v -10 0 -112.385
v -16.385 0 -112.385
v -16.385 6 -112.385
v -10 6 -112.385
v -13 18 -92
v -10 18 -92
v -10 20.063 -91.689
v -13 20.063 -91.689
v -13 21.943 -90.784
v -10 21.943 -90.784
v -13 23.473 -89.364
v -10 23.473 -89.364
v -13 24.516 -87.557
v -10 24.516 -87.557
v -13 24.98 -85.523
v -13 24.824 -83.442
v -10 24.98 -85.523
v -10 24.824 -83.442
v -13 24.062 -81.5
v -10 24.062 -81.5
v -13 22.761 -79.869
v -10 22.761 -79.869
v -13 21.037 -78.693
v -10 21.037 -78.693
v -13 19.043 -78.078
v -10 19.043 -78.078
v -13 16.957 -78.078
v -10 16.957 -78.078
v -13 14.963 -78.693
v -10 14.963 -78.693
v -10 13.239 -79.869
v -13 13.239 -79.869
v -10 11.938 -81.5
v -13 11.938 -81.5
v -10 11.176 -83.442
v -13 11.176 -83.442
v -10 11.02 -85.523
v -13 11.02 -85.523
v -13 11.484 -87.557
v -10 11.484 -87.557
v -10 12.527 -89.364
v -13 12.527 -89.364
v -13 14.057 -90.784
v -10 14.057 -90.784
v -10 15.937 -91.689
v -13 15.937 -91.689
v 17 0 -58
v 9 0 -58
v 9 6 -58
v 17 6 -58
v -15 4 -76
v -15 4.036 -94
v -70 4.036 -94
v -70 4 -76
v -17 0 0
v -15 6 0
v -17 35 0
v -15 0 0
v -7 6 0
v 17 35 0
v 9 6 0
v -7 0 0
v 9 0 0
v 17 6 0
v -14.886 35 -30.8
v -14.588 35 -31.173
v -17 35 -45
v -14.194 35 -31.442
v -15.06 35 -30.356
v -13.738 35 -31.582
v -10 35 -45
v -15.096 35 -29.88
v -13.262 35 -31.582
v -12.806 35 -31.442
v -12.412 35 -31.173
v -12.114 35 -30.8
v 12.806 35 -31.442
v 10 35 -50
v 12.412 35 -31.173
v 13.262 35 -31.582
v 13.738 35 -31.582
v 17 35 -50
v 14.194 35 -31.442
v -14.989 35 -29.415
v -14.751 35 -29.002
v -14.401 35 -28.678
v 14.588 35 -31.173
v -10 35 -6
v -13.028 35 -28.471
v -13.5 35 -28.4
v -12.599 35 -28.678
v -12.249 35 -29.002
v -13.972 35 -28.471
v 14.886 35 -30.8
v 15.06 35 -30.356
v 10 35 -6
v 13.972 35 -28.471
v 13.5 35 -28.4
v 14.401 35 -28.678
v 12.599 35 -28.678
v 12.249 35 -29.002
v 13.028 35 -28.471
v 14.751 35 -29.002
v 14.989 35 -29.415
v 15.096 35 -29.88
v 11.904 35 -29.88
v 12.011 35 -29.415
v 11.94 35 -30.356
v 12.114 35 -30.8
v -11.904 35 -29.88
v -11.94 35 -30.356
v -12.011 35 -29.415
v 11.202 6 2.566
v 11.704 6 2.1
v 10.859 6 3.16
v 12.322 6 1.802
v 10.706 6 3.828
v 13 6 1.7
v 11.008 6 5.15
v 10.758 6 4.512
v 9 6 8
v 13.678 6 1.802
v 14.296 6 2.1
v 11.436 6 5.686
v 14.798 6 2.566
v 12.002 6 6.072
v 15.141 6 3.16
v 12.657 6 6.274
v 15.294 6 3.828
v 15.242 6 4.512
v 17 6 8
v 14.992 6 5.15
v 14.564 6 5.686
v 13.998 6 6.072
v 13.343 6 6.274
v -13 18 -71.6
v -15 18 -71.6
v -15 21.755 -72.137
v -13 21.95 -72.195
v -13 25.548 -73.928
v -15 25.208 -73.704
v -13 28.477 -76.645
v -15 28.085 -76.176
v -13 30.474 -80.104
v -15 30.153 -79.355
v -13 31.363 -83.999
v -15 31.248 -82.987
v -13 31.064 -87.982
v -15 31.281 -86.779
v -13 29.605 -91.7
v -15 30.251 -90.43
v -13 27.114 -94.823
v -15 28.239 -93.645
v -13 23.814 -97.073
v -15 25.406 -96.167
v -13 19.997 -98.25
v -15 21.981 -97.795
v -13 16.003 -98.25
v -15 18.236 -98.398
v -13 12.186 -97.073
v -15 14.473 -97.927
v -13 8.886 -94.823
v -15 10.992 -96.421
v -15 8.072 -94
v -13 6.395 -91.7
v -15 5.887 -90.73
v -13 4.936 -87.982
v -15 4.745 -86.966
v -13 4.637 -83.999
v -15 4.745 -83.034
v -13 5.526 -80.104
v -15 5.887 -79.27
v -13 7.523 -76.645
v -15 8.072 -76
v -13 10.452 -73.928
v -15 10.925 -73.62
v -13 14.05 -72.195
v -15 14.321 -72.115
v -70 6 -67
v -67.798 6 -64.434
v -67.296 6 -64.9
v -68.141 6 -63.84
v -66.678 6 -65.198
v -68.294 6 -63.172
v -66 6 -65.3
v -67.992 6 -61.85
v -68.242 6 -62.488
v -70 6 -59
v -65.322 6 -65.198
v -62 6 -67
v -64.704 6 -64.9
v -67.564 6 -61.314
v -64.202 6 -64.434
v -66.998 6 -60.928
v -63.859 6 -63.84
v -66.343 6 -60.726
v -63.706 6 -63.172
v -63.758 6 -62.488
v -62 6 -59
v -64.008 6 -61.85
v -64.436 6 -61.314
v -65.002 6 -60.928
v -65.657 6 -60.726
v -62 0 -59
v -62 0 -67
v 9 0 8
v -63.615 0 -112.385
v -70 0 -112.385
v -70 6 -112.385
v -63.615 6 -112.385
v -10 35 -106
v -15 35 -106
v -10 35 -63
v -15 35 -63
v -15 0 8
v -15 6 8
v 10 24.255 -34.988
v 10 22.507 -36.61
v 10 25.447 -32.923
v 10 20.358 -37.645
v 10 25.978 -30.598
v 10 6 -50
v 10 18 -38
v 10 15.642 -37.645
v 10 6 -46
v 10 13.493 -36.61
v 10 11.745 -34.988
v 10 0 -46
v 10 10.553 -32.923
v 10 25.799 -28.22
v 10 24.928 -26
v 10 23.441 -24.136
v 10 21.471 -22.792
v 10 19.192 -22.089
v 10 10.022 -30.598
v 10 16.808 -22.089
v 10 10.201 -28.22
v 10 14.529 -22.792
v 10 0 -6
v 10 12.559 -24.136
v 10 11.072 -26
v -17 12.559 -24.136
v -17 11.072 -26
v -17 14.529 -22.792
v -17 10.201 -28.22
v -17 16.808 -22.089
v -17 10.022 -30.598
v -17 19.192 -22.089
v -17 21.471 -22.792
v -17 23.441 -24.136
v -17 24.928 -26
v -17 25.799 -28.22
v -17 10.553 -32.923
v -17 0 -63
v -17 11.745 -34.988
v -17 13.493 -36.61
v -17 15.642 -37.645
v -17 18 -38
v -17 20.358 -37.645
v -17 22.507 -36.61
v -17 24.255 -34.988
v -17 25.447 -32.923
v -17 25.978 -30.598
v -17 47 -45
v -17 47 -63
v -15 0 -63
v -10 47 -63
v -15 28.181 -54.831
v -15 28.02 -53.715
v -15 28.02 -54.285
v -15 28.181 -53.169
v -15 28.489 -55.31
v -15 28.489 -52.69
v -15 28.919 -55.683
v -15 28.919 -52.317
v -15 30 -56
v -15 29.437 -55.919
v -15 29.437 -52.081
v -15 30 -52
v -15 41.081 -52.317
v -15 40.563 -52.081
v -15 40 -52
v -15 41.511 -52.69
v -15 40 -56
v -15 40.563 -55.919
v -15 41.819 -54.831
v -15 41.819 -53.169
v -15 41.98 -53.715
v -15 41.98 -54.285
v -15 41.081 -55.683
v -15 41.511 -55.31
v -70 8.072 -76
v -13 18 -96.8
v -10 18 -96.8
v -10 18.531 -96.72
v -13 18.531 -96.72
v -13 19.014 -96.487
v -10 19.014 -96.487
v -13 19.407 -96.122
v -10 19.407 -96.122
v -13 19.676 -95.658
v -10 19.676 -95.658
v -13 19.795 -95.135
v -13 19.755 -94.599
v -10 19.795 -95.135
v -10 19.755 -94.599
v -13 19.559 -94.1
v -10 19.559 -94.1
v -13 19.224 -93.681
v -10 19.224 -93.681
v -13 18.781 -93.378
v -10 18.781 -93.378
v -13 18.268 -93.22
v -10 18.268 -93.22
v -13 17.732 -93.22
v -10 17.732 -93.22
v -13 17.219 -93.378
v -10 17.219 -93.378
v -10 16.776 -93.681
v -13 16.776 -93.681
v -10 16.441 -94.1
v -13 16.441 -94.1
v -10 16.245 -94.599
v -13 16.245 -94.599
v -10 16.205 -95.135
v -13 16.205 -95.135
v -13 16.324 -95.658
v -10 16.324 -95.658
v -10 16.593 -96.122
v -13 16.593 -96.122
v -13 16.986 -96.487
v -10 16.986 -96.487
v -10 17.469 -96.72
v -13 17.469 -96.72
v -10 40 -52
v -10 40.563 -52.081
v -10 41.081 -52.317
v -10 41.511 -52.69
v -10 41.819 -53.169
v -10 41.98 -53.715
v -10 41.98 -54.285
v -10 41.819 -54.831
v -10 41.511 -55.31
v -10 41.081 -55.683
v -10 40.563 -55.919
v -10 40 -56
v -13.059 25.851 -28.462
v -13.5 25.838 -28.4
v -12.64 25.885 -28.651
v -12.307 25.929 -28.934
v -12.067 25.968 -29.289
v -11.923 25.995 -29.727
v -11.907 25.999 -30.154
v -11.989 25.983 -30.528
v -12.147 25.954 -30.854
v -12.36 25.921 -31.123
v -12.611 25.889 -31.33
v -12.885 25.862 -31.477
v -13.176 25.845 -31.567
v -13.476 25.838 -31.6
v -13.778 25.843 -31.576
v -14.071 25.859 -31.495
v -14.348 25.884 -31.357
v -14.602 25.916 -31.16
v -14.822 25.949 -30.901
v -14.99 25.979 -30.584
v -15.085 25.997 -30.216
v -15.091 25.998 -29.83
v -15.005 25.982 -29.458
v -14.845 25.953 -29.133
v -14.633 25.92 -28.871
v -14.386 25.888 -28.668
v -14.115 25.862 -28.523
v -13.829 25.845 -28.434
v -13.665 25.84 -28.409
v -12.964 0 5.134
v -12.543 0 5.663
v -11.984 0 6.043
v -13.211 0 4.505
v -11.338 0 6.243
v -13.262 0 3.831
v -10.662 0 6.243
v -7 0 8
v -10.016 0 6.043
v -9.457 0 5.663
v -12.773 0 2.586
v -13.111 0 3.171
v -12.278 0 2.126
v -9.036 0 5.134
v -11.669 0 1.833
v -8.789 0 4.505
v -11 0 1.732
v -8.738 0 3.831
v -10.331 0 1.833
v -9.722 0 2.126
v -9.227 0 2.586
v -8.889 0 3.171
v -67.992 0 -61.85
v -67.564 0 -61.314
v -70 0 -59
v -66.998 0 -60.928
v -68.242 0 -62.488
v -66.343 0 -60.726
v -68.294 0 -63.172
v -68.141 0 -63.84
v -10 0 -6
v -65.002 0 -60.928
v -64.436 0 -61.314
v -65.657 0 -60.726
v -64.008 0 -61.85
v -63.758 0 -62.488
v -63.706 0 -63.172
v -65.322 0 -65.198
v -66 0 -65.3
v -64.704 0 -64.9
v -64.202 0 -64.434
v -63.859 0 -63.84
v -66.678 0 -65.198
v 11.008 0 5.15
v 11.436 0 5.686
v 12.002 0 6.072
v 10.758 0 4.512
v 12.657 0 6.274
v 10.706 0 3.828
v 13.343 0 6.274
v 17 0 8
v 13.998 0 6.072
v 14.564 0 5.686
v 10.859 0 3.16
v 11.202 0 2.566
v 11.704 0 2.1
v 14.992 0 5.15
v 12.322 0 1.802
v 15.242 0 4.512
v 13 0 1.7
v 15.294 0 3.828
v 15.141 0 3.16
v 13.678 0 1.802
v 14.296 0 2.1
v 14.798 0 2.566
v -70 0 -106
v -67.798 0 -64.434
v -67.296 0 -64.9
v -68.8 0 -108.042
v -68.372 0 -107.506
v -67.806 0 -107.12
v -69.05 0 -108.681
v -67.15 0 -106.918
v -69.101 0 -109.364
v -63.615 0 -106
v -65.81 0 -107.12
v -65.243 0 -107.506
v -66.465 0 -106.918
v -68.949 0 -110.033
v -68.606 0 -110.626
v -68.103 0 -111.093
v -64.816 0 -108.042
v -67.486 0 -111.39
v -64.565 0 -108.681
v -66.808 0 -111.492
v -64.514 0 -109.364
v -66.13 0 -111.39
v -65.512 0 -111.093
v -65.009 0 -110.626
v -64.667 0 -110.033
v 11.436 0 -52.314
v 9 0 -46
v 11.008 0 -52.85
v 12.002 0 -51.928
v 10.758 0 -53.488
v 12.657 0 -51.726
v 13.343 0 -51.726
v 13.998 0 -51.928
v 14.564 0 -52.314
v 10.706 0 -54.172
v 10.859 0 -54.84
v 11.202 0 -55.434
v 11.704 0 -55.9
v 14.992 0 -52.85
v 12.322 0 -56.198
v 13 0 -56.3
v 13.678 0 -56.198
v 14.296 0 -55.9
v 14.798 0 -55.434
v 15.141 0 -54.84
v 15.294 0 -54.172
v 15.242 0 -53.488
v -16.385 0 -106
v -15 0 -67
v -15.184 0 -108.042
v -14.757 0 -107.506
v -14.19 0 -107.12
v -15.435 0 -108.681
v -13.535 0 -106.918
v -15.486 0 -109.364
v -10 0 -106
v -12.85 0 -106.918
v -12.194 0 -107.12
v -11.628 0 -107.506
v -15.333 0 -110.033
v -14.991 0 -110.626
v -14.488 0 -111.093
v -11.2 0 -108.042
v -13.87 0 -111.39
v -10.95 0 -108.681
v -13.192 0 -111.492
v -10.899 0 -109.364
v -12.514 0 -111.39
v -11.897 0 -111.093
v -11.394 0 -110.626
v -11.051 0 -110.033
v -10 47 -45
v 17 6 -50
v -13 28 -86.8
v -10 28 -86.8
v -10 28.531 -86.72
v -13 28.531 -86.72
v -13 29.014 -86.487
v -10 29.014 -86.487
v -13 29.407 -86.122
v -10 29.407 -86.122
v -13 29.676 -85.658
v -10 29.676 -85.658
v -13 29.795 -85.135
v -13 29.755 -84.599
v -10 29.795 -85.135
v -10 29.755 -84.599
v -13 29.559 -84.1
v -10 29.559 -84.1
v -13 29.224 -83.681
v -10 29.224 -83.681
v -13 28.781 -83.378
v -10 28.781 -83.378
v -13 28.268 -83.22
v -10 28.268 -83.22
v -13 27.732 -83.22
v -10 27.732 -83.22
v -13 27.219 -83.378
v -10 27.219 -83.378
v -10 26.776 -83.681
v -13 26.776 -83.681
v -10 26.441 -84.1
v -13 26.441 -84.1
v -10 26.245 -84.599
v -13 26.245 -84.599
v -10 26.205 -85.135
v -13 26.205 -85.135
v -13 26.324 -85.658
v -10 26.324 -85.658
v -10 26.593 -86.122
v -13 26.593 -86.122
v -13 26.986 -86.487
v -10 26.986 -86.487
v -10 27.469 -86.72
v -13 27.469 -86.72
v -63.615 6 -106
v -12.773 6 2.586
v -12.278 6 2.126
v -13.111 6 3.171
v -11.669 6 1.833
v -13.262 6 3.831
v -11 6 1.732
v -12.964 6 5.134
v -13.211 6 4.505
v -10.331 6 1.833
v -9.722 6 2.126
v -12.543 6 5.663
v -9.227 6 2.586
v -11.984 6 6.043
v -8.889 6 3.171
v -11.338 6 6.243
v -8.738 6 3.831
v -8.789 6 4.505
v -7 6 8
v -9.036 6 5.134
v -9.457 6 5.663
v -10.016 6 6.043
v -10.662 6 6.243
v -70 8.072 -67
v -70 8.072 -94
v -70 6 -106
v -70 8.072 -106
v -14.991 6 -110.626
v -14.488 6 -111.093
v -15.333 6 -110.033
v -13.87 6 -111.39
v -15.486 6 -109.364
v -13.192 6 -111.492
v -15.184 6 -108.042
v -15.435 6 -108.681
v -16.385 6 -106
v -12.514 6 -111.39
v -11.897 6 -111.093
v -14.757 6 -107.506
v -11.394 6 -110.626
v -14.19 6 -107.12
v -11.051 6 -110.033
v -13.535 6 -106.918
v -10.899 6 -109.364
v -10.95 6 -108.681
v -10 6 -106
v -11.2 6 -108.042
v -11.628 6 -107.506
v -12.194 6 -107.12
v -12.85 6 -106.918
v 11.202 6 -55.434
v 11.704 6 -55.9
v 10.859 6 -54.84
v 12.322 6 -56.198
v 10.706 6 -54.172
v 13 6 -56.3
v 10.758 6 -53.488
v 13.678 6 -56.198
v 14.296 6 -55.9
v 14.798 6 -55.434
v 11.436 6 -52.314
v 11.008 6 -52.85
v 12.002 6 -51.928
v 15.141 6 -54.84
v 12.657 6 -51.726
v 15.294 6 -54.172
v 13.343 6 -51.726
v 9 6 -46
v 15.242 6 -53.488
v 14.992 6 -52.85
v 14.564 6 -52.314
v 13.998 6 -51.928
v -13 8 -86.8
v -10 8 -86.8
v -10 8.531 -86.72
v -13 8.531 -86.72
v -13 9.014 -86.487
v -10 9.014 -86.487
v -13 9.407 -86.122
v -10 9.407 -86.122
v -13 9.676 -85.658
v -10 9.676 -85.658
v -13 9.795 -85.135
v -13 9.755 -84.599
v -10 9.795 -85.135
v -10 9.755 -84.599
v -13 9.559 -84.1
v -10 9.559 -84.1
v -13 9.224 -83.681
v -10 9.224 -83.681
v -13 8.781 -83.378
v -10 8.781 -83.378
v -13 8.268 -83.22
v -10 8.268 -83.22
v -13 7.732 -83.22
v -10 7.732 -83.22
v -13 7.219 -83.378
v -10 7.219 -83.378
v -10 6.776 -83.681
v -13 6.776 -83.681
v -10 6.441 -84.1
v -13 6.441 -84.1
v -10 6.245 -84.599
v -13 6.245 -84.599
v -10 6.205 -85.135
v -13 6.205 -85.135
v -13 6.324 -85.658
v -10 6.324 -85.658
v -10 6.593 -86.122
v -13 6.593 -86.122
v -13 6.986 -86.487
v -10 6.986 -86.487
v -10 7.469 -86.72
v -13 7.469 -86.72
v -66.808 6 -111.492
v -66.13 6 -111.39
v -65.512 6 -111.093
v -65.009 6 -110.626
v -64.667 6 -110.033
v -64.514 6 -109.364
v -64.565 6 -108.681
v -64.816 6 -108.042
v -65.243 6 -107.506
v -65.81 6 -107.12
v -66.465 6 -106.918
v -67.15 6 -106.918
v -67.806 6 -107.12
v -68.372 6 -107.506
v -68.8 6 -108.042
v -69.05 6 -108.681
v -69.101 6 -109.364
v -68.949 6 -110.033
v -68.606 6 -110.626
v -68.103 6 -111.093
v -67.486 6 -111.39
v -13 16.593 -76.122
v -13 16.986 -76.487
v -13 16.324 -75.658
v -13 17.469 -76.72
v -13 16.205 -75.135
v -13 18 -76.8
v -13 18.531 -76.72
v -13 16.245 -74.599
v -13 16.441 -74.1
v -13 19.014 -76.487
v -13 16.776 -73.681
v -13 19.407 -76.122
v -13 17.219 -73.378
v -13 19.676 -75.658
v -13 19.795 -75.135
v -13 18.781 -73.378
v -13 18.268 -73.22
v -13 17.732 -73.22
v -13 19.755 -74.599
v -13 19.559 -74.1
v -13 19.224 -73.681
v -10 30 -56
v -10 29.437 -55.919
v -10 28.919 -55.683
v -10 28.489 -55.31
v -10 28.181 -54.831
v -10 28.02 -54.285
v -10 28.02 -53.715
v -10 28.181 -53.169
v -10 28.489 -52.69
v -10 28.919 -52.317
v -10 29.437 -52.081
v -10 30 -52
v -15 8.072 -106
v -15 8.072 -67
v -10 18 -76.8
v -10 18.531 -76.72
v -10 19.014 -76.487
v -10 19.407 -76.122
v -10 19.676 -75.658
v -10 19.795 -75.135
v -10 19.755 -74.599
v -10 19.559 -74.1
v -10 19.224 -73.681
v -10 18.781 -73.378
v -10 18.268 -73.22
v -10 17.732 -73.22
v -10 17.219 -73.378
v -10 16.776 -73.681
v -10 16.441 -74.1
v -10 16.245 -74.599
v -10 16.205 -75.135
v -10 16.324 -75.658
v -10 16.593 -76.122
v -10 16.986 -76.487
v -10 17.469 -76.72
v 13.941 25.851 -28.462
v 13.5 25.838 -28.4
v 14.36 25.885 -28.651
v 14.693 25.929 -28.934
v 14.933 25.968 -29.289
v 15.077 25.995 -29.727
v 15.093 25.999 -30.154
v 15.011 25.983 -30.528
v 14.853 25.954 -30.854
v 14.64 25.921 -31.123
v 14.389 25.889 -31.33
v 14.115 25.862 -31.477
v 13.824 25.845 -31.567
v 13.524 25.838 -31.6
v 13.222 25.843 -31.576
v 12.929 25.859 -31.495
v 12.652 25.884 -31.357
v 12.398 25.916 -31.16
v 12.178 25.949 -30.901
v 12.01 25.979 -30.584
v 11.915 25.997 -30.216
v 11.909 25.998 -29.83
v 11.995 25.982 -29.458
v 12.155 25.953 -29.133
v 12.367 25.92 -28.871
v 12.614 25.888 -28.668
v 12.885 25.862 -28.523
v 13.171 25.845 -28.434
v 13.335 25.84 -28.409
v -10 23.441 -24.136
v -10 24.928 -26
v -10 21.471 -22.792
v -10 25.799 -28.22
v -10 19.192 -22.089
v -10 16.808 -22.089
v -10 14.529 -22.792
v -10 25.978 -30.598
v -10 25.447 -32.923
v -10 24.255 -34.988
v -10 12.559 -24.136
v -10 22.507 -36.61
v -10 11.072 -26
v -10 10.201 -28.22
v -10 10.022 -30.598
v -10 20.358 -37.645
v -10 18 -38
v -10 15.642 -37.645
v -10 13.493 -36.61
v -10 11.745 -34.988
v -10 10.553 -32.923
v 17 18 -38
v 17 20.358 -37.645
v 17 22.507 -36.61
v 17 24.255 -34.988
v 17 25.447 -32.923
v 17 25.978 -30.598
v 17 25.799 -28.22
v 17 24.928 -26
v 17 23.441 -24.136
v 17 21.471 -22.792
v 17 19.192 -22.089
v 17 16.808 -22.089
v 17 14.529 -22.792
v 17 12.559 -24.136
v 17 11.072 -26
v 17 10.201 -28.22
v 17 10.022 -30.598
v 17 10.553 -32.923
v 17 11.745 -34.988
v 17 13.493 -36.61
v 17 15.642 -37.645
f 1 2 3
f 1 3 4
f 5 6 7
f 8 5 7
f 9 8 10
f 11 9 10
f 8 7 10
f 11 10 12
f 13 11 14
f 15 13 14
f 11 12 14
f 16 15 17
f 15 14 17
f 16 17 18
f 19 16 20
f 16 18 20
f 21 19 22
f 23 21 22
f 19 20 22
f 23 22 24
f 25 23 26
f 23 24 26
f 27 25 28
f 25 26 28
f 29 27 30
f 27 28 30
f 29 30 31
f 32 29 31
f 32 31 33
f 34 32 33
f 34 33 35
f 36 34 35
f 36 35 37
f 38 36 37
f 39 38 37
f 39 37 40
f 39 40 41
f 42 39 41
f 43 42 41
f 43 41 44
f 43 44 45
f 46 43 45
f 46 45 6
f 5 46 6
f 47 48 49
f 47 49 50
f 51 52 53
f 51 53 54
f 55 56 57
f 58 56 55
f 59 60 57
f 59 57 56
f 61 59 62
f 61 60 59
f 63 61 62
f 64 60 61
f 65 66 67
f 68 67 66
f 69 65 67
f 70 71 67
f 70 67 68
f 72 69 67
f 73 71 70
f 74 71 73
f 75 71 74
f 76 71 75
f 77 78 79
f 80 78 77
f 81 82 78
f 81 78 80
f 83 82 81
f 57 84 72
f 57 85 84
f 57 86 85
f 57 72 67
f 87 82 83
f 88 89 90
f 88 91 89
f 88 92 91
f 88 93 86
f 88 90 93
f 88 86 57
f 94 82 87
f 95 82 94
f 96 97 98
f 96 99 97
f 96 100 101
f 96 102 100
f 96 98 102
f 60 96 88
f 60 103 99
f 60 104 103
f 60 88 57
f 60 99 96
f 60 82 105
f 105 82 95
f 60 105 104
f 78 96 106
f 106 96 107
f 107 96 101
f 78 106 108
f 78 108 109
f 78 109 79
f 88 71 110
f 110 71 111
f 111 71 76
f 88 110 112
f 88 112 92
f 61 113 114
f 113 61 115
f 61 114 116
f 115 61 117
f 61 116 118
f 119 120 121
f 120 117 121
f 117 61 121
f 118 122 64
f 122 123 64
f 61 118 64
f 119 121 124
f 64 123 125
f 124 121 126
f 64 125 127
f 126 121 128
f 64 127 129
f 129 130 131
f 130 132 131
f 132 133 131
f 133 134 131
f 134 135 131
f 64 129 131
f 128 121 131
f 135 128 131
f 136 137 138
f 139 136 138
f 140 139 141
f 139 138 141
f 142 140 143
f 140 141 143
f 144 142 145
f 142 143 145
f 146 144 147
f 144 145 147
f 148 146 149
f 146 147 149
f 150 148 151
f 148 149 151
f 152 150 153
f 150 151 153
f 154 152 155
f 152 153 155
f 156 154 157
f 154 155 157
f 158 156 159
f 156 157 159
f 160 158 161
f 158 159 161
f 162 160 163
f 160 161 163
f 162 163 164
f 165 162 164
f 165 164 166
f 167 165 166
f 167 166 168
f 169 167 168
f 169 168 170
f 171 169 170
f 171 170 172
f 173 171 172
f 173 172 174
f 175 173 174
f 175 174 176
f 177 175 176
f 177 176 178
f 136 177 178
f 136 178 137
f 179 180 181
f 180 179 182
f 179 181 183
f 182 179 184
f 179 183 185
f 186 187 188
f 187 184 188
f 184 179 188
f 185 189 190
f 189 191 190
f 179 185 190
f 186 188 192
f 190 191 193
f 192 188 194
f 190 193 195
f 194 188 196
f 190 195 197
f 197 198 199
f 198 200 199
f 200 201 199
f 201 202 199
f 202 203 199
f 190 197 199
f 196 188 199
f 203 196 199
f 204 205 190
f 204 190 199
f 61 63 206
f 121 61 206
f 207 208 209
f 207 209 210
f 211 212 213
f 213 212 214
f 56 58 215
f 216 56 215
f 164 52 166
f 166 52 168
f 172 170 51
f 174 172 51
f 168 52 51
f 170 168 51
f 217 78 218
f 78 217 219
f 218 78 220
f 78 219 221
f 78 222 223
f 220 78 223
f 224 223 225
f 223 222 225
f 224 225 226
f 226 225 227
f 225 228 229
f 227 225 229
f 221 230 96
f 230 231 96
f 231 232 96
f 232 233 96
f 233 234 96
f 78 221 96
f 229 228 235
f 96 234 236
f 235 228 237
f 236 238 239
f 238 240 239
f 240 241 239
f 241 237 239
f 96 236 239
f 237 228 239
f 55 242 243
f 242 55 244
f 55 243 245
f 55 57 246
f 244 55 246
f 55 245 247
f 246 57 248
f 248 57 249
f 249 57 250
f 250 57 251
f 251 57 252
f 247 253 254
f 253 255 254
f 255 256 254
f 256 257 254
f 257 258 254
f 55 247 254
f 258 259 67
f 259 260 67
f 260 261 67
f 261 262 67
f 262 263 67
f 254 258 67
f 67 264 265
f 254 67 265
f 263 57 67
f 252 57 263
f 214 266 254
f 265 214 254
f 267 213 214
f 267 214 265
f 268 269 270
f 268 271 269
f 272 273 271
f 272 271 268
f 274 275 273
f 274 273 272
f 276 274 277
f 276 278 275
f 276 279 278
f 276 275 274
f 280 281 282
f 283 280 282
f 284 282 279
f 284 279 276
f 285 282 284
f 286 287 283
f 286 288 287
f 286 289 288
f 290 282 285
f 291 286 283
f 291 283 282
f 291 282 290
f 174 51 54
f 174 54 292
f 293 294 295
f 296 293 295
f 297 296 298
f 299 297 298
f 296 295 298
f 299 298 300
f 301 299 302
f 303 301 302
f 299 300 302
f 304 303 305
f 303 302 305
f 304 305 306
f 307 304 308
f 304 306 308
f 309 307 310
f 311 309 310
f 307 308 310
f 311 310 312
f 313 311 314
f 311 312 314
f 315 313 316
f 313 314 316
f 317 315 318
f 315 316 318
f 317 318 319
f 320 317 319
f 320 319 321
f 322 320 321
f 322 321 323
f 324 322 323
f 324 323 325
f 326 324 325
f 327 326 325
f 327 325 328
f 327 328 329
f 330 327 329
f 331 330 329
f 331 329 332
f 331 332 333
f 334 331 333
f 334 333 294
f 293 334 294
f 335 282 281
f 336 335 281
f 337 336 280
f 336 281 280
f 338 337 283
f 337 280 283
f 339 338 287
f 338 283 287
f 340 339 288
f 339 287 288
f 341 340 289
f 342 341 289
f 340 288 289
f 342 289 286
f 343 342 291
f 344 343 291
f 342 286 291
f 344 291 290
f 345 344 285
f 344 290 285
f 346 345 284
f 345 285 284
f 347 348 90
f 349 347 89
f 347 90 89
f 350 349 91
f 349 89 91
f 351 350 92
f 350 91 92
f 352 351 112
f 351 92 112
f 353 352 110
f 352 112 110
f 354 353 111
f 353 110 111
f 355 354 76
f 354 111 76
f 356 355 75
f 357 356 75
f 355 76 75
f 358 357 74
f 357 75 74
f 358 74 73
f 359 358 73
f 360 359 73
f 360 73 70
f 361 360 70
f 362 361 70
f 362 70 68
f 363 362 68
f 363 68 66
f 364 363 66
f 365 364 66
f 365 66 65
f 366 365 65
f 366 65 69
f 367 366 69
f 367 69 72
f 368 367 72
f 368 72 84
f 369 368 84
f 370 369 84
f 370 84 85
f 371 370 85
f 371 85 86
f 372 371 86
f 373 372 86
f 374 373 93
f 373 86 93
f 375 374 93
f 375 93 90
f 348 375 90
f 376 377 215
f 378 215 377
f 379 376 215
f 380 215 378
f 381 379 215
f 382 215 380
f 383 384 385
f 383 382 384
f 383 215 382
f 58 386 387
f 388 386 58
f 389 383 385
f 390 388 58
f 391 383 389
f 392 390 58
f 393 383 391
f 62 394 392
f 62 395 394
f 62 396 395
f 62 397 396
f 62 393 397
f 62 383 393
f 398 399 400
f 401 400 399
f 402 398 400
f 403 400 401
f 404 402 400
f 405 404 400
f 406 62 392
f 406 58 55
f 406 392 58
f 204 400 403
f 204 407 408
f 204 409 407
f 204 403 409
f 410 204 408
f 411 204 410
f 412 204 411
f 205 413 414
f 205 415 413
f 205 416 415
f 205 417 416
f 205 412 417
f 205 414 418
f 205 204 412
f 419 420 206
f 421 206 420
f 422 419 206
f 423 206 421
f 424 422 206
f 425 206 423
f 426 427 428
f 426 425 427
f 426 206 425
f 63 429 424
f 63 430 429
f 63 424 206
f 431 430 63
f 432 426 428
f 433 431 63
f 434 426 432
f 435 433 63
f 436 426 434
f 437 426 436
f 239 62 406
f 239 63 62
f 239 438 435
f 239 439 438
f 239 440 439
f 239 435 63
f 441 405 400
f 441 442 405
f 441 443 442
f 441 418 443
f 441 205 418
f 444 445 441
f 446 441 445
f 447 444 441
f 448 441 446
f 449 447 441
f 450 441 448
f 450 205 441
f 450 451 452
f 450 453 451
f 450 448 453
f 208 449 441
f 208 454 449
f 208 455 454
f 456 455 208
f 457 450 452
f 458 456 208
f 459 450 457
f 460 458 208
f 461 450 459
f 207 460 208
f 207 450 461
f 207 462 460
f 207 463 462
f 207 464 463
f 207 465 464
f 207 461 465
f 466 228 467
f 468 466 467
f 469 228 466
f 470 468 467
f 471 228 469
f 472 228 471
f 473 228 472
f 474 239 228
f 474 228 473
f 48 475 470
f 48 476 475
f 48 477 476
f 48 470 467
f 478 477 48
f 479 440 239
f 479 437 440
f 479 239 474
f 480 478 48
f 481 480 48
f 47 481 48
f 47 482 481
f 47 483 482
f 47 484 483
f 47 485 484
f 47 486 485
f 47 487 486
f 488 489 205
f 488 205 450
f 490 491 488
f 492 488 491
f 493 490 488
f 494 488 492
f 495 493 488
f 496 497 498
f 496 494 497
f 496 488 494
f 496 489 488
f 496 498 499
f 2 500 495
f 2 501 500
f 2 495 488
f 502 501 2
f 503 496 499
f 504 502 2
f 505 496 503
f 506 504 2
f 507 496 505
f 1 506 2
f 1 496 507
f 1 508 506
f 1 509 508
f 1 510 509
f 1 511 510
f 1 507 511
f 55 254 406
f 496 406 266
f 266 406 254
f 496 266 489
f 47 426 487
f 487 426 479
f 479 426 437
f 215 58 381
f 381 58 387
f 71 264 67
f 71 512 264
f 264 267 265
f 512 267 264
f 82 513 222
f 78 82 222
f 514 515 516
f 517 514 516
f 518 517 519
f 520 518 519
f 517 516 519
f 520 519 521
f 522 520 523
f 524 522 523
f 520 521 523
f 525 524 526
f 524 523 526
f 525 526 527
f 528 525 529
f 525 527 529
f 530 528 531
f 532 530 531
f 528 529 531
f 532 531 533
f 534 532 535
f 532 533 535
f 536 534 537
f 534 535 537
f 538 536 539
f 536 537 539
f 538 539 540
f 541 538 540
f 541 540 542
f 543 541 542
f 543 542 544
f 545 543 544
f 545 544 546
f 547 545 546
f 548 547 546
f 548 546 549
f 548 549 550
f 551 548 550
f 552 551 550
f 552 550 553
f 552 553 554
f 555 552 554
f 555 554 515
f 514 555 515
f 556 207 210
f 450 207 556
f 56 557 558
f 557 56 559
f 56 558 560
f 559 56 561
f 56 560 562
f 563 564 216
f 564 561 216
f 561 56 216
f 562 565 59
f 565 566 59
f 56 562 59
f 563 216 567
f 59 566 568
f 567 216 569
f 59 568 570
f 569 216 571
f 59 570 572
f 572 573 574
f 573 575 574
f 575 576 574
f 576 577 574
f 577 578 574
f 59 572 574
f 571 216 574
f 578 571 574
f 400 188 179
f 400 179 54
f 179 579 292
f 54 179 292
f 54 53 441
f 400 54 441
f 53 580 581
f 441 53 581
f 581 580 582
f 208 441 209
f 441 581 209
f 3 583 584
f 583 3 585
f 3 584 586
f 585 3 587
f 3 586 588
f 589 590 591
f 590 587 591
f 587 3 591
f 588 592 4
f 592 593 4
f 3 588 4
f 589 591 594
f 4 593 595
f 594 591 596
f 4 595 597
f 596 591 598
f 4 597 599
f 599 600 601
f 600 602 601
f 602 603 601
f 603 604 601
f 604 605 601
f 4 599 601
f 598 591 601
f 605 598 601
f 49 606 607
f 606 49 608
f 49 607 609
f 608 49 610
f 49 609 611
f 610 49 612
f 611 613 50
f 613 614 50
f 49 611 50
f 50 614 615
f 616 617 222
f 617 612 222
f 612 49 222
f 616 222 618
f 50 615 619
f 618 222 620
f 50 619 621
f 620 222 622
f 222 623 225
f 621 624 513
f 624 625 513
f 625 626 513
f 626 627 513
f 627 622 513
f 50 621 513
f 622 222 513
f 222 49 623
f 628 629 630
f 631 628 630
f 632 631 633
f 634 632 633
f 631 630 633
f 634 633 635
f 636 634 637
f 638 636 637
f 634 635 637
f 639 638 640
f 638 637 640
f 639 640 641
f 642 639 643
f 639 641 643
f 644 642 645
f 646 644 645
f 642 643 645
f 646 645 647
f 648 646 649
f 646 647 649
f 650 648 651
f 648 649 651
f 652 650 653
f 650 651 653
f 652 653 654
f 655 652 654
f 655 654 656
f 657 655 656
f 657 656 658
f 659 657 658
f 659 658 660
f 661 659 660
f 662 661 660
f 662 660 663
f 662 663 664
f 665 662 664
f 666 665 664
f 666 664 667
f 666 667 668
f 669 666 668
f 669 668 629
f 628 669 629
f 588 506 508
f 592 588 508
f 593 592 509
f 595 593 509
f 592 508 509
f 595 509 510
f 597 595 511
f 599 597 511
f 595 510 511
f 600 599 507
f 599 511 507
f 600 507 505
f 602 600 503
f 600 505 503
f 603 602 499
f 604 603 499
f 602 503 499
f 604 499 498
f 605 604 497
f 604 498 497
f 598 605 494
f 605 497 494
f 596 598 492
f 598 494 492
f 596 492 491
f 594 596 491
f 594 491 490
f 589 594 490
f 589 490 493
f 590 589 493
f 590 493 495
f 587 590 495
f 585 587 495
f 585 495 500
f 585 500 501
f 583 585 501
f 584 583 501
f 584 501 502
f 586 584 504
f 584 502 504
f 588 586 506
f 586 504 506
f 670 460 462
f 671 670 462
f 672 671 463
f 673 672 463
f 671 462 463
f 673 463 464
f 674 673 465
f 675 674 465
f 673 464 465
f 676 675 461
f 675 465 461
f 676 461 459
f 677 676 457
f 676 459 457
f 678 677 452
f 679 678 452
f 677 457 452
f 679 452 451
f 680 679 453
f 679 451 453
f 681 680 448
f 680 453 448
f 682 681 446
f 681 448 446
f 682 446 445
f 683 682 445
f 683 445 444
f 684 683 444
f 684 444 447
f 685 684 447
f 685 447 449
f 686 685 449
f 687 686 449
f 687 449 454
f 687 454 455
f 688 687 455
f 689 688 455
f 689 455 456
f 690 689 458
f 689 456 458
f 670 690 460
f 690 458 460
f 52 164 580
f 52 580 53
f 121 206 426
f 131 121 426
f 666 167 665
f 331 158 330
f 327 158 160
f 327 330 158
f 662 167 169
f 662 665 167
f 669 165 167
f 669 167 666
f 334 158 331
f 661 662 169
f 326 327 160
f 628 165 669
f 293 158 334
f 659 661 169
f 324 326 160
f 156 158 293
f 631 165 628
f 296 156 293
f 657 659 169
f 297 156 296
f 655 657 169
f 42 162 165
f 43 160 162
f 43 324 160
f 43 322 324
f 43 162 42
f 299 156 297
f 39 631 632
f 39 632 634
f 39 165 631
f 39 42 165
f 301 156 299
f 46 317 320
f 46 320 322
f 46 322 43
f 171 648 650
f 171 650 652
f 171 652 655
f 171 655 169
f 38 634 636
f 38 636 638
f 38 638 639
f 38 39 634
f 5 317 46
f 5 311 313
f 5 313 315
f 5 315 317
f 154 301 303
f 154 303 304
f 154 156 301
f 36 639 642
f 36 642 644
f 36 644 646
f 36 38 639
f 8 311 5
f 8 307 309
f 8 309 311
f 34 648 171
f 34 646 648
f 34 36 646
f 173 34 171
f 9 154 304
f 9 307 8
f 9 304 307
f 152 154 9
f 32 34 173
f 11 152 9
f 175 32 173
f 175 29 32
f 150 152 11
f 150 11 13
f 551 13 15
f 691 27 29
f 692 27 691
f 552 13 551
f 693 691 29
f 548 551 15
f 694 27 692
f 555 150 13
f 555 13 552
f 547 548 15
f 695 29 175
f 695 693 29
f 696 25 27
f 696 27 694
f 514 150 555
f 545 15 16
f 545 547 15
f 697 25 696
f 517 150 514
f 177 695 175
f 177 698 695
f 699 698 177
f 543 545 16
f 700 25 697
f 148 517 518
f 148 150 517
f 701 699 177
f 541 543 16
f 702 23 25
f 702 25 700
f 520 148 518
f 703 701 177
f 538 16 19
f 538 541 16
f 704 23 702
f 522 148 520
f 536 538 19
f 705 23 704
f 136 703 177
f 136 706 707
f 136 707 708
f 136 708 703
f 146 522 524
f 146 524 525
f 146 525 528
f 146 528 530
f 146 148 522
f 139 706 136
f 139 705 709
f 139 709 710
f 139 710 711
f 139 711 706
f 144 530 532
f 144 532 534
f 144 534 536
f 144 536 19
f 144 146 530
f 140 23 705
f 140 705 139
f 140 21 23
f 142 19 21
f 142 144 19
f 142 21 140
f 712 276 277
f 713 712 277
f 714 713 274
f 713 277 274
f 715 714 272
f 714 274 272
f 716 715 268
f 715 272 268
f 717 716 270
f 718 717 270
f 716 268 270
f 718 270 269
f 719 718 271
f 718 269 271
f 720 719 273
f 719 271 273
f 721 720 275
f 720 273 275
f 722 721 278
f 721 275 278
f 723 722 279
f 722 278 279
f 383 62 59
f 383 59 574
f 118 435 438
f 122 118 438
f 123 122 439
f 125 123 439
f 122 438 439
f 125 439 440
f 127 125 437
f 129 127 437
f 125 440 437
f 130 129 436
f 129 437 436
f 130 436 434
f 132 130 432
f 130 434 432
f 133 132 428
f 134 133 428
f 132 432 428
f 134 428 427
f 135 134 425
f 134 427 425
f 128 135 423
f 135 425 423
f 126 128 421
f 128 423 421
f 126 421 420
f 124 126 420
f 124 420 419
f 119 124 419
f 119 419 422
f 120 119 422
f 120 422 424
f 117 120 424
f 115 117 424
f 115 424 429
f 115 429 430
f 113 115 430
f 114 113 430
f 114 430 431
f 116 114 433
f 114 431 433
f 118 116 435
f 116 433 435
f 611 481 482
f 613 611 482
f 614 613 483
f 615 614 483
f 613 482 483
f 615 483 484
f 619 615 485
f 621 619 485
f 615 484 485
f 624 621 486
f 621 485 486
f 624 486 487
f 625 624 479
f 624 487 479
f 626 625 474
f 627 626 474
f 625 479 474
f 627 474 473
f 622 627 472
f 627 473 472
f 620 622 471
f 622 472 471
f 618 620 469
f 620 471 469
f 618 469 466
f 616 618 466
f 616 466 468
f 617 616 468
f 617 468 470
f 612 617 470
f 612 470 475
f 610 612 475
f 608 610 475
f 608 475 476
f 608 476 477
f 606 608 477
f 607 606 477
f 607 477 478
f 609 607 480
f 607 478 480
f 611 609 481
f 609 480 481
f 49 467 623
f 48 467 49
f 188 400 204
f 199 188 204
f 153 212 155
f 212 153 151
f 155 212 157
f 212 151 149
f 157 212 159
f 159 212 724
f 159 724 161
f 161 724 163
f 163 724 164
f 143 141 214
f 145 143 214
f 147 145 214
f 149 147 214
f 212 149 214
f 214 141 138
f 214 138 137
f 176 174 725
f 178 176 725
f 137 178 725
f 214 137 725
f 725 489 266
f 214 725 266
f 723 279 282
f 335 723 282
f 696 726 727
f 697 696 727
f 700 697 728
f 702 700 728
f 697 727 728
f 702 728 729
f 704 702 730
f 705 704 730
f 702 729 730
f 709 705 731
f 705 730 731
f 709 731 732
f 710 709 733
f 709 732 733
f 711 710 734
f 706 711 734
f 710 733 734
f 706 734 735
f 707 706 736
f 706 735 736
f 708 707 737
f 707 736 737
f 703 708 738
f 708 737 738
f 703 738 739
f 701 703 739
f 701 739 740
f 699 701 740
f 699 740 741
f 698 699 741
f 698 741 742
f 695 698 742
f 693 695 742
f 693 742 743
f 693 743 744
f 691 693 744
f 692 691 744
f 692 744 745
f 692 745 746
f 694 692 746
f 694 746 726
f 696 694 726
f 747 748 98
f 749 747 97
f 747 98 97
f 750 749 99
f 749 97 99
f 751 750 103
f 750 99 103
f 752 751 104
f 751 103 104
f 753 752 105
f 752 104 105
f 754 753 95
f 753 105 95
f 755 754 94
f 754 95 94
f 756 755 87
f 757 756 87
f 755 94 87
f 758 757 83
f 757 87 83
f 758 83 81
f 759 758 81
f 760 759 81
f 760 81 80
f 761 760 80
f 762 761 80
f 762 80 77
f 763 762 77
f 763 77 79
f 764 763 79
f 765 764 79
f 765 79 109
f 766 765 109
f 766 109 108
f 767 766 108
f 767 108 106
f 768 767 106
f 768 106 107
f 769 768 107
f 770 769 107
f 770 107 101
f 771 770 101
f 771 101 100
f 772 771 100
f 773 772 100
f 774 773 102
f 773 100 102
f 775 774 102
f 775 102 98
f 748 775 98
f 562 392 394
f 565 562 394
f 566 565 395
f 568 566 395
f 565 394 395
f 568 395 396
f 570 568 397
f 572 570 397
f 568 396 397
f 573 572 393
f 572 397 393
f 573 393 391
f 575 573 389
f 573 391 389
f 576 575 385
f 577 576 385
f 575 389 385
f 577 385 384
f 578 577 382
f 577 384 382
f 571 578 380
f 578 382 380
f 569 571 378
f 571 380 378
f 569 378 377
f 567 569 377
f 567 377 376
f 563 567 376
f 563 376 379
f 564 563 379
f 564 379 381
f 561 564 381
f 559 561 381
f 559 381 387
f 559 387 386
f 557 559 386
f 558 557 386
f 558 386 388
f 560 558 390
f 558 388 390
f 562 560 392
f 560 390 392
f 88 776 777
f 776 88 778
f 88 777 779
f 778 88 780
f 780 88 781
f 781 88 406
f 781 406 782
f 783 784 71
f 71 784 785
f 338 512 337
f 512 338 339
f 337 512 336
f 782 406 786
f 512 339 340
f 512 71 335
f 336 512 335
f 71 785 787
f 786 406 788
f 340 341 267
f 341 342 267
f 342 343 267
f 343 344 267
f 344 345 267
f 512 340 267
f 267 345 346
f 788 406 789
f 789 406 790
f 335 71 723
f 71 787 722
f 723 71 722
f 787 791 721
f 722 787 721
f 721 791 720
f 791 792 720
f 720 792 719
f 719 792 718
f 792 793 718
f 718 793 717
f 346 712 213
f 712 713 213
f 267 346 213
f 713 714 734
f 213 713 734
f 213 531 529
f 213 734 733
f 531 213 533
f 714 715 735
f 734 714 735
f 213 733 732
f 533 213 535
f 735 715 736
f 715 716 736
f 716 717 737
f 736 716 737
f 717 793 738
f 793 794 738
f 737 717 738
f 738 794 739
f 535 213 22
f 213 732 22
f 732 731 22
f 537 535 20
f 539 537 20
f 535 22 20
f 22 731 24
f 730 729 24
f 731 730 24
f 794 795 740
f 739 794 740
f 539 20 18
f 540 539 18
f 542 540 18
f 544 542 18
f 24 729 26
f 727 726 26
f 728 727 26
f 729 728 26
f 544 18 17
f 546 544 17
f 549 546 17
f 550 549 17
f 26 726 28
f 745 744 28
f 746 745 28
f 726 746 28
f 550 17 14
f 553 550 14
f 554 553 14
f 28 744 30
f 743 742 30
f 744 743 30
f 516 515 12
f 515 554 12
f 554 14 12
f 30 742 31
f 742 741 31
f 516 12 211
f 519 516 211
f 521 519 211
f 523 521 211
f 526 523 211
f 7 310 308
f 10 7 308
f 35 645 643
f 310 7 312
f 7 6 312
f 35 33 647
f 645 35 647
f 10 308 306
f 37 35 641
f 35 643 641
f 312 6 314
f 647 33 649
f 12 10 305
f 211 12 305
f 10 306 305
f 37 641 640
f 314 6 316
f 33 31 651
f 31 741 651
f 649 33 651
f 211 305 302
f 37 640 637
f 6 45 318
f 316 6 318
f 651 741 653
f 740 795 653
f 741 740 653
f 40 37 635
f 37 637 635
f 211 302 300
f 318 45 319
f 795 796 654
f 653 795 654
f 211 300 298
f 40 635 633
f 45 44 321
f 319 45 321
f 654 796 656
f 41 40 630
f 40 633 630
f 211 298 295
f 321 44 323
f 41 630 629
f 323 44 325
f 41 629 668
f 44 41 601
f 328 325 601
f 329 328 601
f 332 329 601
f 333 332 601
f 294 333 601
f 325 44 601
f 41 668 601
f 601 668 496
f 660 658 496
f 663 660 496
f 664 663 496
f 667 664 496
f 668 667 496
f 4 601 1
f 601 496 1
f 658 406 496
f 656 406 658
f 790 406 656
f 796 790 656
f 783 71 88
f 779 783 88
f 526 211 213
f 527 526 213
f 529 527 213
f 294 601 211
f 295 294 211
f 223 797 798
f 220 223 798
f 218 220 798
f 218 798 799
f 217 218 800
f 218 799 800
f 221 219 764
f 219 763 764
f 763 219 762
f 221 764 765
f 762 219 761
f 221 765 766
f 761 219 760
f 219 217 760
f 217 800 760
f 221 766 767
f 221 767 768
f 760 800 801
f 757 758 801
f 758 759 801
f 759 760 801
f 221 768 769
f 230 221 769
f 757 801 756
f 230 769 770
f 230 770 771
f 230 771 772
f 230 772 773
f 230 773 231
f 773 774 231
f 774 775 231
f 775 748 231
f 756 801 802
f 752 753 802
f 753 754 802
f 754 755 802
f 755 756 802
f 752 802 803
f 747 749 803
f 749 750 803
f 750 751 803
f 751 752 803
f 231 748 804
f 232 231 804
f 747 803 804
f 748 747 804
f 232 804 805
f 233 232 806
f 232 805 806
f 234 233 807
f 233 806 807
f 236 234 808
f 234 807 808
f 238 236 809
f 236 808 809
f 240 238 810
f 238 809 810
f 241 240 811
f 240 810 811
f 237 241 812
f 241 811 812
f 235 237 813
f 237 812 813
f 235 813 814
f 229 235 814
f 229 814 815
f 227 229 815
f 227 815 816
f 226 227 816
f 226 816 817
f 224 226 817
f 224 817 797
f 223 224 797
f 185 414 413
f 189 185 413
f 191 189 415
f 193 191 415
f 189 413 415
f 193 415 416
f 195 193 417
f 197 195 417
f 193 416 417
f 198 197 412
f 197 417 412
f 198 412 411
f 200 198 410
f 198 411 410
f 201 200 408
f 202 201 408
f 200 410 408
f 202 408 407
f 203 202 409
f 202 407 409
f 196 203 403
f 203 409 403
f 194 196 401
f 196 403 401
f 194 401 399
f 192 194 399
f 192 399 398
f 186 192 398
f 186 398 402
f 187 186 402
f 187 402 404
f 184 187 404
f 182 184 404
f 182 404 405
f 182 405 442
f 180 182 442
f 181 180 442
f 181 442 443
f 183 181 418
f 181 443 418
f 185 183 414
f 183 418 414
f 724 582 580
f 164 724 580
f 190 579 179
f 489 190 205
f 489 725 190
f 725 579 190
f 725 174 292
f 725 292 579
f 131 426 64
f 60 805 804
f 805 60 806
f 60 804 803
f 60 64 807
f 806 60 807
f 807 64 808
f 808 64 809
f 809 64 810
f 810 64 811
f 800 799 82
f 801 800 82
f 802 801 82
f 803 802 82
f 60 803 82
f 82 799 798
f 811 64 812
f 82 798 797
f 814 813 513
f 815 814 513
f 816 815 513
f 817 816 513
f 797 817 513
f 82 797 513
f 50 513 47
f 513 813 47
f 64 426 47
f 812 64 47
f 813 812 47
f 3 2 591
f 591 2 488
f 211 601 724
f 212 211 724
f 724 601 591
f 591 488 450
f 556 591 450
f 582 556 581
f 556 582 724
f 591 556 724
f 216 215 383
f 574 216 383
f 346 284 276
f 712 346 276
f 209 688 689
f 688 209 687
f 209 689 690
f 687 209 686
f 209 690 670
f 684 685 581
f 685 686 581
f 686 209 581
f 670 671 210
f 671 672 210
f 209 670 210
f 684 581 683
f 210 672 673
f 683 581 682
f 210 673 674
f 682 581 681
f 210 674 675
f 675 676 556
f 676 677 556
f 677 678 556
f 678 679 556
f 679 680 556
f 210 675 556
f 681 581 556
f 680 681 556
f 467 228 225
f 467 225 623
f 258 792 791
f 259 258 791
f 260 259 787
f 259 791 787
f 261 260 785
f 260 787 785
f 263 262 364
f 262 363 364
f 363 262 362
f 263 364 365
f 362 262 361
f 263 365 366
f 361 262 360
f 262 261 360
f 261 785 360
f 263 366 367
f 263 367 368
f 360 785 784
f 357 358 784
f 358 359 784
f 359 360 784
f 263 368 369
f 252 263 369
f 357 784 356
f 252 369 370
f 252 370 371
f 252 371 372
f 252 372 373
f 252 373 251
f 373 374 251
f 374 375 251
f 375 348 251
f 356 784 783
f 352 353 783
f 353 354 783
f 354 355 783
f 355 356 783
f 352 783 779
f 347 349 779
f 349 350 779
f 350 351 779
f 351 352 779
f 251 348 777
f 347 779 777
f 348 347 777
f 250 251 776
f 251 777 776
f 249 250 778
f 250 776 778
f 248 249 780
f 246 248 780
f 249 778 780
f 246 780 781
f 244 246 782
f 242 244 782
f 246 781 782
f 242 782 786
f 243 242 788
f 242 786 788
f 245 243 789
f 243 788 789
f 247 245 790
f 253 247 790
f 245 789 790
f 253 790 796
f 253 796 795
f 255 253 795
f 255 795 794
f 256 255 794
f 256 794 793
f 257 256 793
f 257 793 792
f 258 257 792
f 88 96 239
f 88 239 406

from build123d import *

# Parameters (mm, degrees)
BOSS_EXTRU_1_DEPTH       = 47
ESQUISSE3_R              = 2
ENL_V_MAT_EXTRU_2_DEPTH  = 50
ESQUISSE4_R              = 1.8
ESQUISSE4_R_2            = 7
ENL_V_MAT_EXTRU_3_DEPTH  = 5
BOSS_EXTRU_2_DEPTH       = 60
ESQUISSE11_W             = 8
ESQUISSE11_H             = 8
ESQUISSE11_R             = 2.3
ESQUISSE11_R_2           = 2.268048231
ESQUISSE11_W_2           = 6.384615385
ESQUISSE11_H_2           = 6.384615385
BOSS_EXTRU_6_DEPTH       = 6
ESQUISSE12_W             = 43
ESQUISSE12_H             = 12
ESQUISSE12_W_2           = 45
ENL_V_MAT_EXTRU_5_DEPTH  = 50
ESQUISSE13_W             = 5
ESQUISSE13_H             = 12
ENL_V_MAT_EXTRU_6_DEPTH  = 20
ESQUISSE25_R             = 13.4
ENL_V_MAT_EXTRU_8_DEPTH  = 2
ESQUISSE26_R             = 1.6
ENL_V_MAT_EXTRU_9_DEPTH  = 10
BOSS_EXTRU_7_DEPTH       = 2
ESQUISSE2_R              = 8
ENL_V_MAT_EXTRU_10_DEPTH = 60
ESQUISSE30_R             = 1.6
ENL_V_MAT_EXTRU_18_DEPTH = 10


with BuildPart() as part:
    # Esquisse1 → Boss.-Extru.1 (new body)
    with BuildSketch(Plane(origin=(0, 0, 0), x_dir=(1, 0, 0), z_dir=(0, 1, 0))):
        Polygon((-15, 0), (17, 0), (17, 50), (10, 50), (10, 6), (-10, 6), (-10, 106), (-15, 106), align=None)
    extrude(amount=BOSS_EXTRU_1_DEPTH)

    # Esquisse3 → Enlèv. mat.-Extru.2 (cut)
    with BuildSketch(Plane.ZY.offset(15)):
        with BuildLine():
            Line((-52, 30), (-52, 40))
            ThreePointArc((-52, 40), (-54, 38), (-56, 40))
            Line((-56, 40), (-56, 30))
            ThreePointArc((-56, 30), (-54, 32), (-52, 30))
        make_face()
        with Locations((-54, 40)):
            Circle(ESQUISSE3_R)
        with Locations((-54, 30)):
            Circle(ESQUISSE3_R)
    extrude(amount=-ENL_V_MAT_EXTRU_2_DEPTH, mode=Mode.SUBTRACT)

    # Esquisse4 → Enlèv. mat.-Extru.3 (cut)
    with BuildSketch(Plane(origin=(-10, 0, 0), x_dir=(0, 0, -1), z_dir=(1, 0, 0))):
        with Locations((85, 8)):
            Circle(ESQUISSE4_R)
        with Locations((95, 18)):
            Circle(ESQUISSE4_R)
        with Locations((75, 18)):
            Circle(ESQUISSE4_R)
        with Locations((85, 28)):
            Circle(ESQUISSE4_R)
        with Locations((85, 18)):
            Circle(ESQUISSE4_R_2)
    extrude(amount=-ENL_V_MAT_EXTRU_3_DEPTH, mode=Mode.SUBTRACT)

    # Esquisse4<4> → Boss.-Extru.2 (add)
    with BuildSketch(Plane(origin=(-10, 0, 0), x_dir=(0, 0, -1), z_dir=(1, 0, 0))):
        Polygon((94, 0), (106, 0), (106, 8.072261083), (94, 8.072261083), (94, 4.036130542), align=None)
        Polygon((67, 0), (76, 0), (76, 4), (76, 8.072261083), (67, 8.072261083), align=None)
        Polygon((76, 0), (94, 0), (94, 4.036130542), (76, 4), align=None)
    extrude(amount=-BOSS_EXTRU_2_DEPTH)

    # Esquisse11 → Boss.-Extru.6 (add)
    # profile 1 of 6: a face of its own
    with BuildSketch(Plane.XZ):
        with Locations((13, 4)):
            Rectangle(ESQUISSE11_W, ESQUISSE11_H)
        with Locations(Location((13, 4, 0), (0, 0, 270))):
            Circle(ESQUISSE11_R, mode=Mode.SUBTRACT)
    # profile 2 of 6: a face of its own
    with BuildSketch(Plane.XZ):
        Polygon((17, -58), (17, -50), (10, -50), (10, -46), (9, -46), (9, -58), align=None)
        with Locations(Location((13, -54, 0), (0, 0, 270))):
            Circle(ESQUISSE11_R, mode=Mode.SUBTRACT)
    # profile 3 of 6: a face of its own
    with BuildSketch(Plane.XZ):
        with Locations((-11, 4)):
            Rectangle(ESQUISSE11_W, ESQUISSE11_H)
        with Locations(Location((-11, 4, 0), (0, 0, 270))):
            Circle(ESQUISSE11_R_2, mode=Mode.SUBTRACT)
    # profile 4 of 6: a face of its own
    with BuildSketch(Plane.XZ):
        with Locations((-66, -63)):
            Rectangle(ESQUISSE11_W, ESQUISSE11_H)
        with Locations(Location((-66, -63, 0), (0, 0, 270))):
            Circle(ESQUISSE11_R, mode=Mode.SUBTRACT)
    # profile 5 of 6: a face of its own
    with BuildSketch(Plane.XZ):
        with Locations((-13.192307693, -109.192307693)):
            Rectangle(ESQUISSE11_W_2, ESQUISSE11_H_2)
        with Locations(Location((-13.192307692, -109.192307692, 0), (0, 0, 270))):
            Circle(ESQUISSE11_R, mode=Mode.SUBTRACT)
    # profile 6 of 6: a face of its own
    with BuildSketch(Plane.XZ):
        with Locations((-66.807692308, -109.192307693)):
            Rectangle(ESQUISSE11_W_2, ESQUISSE11_H_2)
        with Locations(Location((-66.807692308, -109.192307692, 0), (0, 0, 270))):
            Circle(ESQUISSE11_R, mode=Mode.SUBTRACT)
    extrude(amount=-BOSS_EXTRU_6_DEPTH)

    # Esquisse12 → Enlèv. mat.-Extru.5 (cut)
    with BuildSketch(Plane.ZY.offset(15)):
        with Locations((-84.5, 41)):
            Rectangle(ESQUISSE12_W, ESQUISSE12_H)
        with Locations((-22.5, 41)):
            Rectangle(ESQUISSE12_W_2, ESQUISSE12_H)
    extrude(amount=-ENL_V_MAT_EXTRU_5_DEPTH, mode=Mode.SUBTRACT)

    # Esquisse13 → Enlèv. mat.-Extru.6 (cut)
    with BuildSketch(Plane(origin=(17, 0, 0), x_dir=(0, 0, -1), z_dir=(1, 0, 0))):
        with Locations((47.5, 41)):
            Rectangle(ESQUISSE13_W, ESQUISSE13_H)
    extrude(amount=-ENL_V_MAT_EXTRU_6_DEPTH, mode=Mode.SUBTRACT)

    # Esquisse25 → Enlèv. mat.-Extru.8 (cut)
    with BuildSketch(Plane.ZY.offset(15)):
        with Locations((-85, 18)):
            Circle(ESQUISSE25_R)
    extrude(amount=-ENL_V_MAT_EXTRU_8_DEPTH, mode=Mode.SUBTRACT)

    # Esquisse26 → Enlèv. mat.-Extru.9 (cut)
    with BuildSketch(Plane(origin=(0, 35, 0), x_dir=(1, 0, 0), z_dir=(0, 1, 0))):
        with Locations(Location((13.5, 30, 0), (0, 0, 270))):
            Circle(ESQUISSE26_R)
    extrude(amount=-ENL_V_MAT_EXTRU_9_DEPTH, mode=Mode.SUBTRACT)

    # Esquisse27 → Boss.-Extru.7 (add)
    with BuildSketch(Plane.ZY.offset(15)):
        Polygon((0, 35), (0, 0), (-63, 0), (-63, 47), (-45, 47), (-45, 35), align=None)
    extrude(amount=BOSS_EXTRU_7_DEPTH)

    # Esquisse2 → Enlèv. mat.-Extru.10 (cut)
    with BuildSketch(Plane(origin=(17, 0, 0), x_dir=(0, 0, -1), z_dir=(1, 0, 0))):
        with Locations((30, 18)):
            Circle(ESQUISSE2_R)
    extrude(amount=-ENL_V_MAT_EXTRU_10_DEPTH, mode=Mode.SUBTRACT)

    # Esquisse30 → Enlèv. mat.-Extru.18 (cut)
    with BuildSketch(Plane(origin=(0, 35, 0), x_dir=(1, 0, 0), z_dir=(0, 1, 0))):
        with Locations(Location((-13.5, 30, 0), (0, 0, 270))):
            Circle(ESQUISSE30_R)
    extrude(amount=-ENL_V_MAT_EXTRU_18_DEPTH, mode=Mode.SUBTRACT)


solid = part.part
